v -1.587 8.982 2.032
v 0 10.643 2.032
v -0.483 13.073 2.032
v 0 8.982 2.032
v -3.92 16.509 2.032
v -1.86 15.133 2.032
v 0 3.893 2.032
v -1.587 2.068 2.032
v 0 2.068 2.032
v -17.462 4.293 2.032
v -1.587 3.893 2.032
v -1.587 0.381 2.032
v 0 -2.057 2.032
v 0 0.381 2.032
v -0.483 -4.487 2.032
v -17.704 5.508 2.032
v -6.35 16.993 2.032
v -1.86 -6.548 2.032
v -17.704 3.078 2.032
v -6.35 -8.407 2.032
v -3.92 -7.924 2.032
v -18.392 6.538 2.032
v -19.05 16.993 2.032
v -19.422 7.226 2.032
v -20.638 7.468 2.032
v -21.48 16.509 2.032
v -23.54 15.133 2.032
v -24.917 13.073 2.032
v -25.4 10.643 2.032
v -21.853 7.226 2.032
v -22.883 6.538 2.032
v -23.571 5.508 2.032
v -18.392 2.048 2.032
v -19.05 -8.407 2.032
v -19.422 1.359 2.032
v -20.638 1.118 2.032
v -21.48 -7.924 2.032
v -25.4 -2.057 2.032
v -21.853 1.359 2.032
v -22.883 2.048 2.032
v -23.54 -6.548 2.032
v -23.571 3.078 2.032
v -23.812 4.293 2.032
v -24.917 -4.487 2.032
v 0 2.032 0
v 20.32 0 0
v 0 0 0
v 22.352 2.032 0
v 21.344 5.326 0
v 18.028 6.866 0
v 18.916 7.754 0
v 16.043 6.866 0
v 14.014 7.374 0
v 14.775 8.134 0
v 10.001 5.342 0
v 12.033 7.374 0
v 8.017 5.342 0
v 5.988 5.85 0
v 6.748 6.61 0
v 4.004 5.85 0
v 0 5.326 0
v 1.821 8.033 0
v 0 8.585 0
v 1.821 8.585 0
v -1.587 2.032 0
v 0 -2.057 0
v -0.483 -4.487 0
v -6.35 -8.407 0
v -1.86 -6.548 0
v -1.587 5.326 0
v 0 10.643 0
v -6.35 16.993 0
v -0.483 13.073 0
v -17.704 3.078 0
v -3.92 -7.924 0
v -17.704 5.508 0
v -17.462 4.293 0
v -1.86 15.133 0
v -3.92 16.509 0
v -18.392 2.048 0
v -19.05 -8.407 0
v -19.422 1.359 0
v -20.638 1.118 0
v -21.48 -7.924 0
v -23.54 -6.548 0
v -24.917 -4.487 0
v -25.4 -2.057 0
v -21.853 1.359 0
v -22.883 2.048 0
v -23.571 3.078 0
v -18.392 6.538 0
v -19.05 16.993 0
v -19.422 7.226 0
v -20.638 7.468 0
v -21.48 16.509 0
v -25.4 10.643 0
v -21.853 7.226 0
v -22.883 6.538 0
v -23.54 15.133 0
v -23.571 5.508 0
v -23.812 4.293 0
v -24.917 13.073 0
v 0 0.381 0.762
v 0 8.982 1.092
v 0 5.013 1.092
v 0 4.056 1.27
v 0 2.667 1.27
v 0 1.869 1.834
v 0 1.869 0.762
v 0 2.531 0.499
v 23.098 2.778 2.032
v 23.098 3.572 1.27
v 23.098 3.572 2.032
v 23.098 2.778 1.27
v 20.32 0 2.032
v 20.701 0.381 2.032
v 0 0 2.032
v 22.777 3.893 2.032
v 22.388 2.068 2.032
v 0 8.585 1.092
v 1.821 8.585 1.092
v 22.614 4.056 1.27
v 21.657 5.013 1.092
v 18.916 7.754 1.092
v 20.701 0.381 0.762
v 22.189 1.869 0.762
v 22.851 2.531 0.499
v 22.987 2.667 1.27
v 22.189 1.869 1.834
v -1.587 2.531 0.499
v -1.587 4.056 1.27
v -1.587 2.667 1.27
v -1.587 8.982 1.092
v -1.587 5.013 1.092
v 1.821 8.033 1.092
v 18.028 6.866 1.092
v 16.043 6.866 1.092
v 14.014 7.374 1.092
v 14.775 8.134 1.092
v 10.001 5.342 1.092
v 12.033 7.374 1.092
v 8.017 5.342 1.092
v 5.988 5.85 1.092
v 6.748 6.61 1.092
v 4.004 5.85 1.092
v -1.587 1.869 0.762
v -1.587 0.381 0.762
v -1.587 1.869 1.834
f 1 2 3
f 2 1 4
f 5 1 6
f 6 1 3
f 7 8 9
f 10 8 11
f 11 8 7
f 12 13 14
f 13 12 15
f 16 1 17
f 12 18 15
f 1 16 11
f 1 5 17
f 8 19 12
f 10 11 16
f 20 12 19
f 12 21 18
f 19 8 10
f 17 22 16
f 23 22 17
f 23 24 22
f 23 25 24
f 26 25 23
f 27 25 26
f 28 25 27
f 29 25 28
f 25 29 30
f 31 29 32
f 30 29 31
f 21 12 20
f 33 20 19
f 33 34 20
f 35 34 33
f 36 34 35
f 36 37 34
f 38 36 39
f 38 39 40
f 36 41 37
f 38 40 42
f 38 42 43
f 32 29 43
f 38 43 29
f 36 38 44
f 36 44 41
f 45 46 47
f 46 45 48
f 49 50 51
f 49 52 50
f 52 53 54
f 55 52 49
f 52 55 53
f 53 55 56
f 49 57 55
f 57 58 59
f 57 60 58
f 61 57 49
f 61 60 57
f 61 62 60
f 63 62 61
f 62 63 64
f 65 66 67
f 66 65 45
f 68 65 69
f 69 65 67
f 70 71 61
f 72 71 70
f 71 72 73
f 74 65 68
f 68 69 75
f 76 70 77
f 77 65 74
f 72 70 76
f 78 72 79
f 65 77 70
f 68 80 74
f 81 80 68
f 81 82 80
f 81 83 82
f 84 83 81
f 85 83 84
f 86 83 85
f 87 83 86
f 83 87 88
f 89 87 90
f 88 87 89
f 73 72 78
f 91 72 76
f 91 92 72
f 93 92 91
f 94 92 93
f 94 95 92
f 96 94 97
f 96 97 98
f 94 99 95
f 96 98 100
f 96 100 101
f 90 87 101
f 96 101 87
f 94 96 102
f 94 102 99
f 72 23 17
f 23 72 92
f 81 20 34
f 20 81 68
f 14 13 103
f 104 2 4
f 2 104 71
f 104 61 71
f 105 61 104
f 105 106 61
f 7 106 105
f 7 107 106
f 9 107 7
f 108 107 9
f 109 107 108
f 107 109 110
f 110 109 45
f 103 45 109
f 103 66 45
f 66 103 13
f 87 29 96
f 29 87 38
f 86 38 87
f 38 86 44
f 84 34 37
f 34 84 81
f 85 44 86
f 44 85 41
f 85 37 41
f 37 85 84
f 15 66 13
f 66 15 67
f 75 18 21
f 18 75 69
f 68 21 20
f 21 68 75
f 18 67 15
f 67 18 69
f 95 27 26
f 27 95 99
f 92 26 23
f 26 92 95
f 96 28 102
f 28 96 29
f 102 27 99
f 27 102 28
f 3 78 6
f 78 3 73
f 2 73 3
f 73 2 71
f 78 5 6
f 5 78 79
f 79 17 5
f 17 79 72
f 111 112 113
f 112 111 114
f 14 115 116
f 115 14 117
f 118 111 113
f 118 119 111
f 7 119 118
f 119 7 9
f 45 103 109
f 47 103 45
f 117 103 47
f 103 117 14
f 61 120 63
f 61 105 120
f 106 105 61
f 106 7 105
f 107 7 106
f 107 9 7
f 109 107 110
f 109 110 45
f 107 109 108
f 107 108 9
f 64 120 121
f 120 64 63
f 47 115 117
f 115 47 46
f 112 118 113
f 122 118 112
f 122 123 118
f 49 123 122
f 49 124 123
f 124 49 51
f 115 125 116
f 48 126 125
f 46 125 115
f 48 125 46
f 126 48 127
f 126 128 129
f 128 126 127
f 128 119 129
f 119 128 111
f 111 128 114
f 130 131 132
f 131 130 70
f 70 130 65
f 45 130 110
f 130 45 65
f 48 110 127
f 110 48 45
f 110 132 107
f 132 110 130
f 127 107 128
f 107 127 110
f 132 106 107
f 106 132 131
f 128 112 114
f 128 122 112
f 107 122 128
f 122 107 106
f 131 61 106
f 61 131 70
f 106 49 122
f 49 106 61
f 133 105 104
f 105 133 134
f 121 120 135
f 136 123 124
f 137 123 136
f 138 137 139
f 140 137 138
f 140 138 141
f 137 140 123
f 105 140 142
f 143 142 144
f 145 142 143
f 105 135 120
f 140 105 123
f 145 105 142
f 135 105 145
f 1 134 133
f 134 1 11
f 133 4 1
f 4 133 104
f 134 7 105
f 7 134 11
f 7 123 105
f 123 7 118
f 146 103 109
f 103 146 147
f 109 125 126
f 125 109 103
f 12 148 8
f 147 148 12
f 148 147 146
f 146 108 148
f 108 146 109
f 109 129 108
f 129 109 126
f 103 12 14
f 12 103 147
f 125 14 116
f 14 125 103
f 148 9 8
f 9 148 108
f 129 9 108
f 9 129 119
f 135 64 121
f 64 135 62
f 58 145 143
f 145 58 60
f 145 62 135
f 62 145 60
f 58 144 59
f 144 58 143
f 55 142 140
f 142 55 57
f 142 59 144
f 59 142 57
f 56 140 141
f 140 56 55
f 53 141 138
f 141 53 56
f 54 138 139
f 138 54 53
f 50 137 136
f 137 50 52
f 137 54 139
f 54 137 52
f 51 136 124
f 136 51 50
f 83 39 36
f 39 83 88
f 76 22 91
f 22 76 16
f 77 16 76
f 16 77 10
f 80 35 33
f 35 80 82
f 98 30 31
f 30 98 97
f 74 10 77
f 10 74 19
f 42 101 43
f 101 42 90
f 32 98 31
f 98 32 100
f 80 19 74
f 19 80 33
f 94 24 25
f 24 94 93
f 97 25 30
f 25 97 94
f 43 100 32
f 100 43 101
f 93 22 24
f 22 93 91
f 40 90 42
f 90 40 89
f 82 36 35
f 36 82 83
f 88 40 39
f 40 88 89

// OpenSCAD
// Generated by KeyCopier for Elzett 751 (Euro)
function mm(i) = i*25.4;

module rounded(size, r) { union() { translate([r, 0, 0]) cube([size[0]-2*r, size[1], size[2]]); translate([0, r, 0]) cube([size[0], size[1]-2*r, size[2]]); translate([r, r, 0]) cylinder(h=size[2], r=r, $fn=16); translate([size[0]-r, r, 0]) cylinder(h=size[2], r=r, $fn=16); translate([r, size[1]-r, 0]) cylinder(h=size[2], r=r, $fn=16); translate([size[0]-r, size[1]-r, 0]) cylinder(h=size[2], r=r, $fn=16); } }
module bit() { w = mm(1/4); difference() { translate([-w/2, 0, 0]) cube([w, mm(1), w]); translate([-mm(5/128), 0, 0]) rotate([0, 0, 135]) cube([w, w, w]); translate([mm(5/128), 0, 0]) rotate([0, 0, -45]) cube([w, w, w]); } }
module key(bits) {
    thickness = mm(0.080);
    length = mm(0.925);
    width = mm(0.338);
    shoulder = mm(0.177);
    pin_spacing = mm(0.158);
    depth_inc = mm(0.020);
    fudge = 0.5;
    h_l = mm(1); h_w = mm(1); h_d = mm(1/16);
    difference() {
        union() { translate([-h_l, -h_w/2 + width/2, 0]) rounded([h_l, h_w, thickness], mm(1/4)); cube([length - mm(1/64), width, thickness]); }
        translate([length, mm(1/8), 0]) { rotate([0, 0, 45]) cube([10, 10, thickness]); rotate([0, 0, 225]) cube([10, 10, thickness]); }
        translate([-h_l + mm(3/16), width/2, 0]) cylinder(h=thickness, r=mm(1/8), $fn=16);
        union() { translate([-h_d, mm(.105), mm(.025)]) rotate([225, 0, 0]) cube([length + h_d, width, width]); translate([-h_d, mm(.105), mm(.05)]) rotate([260, 0, 0]) cube([length + h_d, thickness/2, mm(1/32)]); translate([-h_d, mm(.105), 0]) cube([length + h_d, mm(7/128), mm(.05)]); translate([-h_d, mm(.105) + mm(7/128), mm(.05)]) rotate([225, 0, 0]) cube([length + h_d, mm(3/64), thickness]); }
        translate([-h_d, width - mm(9/64), mm(.043)]) { cube([length + h_d, width - (width - mm(10/64)), thickness]); rotate([50, 0, 0]) cube([length + h_d, width, thickness]); }
        union() { translate([-h_d, mm(0.015), mm(.03)]) cube([length + h_d, mm(15/256), thickness]); translate([-h_d, mm(0.015) + mm(13/256), thickness - mm(1/64)]) rotate([45, 0, 0]) cube([length + h_d, mm(1/16), mm(1/16)]); }
        for (b = [0:4]) {
            translate([shoulder + fudge + b*pin_spacing, width - mm(.008) - (bits[b] - 1)*depth_inc - fudge, 0]) bit();
        }
    }
}

key([5,6,2,3,2]);
